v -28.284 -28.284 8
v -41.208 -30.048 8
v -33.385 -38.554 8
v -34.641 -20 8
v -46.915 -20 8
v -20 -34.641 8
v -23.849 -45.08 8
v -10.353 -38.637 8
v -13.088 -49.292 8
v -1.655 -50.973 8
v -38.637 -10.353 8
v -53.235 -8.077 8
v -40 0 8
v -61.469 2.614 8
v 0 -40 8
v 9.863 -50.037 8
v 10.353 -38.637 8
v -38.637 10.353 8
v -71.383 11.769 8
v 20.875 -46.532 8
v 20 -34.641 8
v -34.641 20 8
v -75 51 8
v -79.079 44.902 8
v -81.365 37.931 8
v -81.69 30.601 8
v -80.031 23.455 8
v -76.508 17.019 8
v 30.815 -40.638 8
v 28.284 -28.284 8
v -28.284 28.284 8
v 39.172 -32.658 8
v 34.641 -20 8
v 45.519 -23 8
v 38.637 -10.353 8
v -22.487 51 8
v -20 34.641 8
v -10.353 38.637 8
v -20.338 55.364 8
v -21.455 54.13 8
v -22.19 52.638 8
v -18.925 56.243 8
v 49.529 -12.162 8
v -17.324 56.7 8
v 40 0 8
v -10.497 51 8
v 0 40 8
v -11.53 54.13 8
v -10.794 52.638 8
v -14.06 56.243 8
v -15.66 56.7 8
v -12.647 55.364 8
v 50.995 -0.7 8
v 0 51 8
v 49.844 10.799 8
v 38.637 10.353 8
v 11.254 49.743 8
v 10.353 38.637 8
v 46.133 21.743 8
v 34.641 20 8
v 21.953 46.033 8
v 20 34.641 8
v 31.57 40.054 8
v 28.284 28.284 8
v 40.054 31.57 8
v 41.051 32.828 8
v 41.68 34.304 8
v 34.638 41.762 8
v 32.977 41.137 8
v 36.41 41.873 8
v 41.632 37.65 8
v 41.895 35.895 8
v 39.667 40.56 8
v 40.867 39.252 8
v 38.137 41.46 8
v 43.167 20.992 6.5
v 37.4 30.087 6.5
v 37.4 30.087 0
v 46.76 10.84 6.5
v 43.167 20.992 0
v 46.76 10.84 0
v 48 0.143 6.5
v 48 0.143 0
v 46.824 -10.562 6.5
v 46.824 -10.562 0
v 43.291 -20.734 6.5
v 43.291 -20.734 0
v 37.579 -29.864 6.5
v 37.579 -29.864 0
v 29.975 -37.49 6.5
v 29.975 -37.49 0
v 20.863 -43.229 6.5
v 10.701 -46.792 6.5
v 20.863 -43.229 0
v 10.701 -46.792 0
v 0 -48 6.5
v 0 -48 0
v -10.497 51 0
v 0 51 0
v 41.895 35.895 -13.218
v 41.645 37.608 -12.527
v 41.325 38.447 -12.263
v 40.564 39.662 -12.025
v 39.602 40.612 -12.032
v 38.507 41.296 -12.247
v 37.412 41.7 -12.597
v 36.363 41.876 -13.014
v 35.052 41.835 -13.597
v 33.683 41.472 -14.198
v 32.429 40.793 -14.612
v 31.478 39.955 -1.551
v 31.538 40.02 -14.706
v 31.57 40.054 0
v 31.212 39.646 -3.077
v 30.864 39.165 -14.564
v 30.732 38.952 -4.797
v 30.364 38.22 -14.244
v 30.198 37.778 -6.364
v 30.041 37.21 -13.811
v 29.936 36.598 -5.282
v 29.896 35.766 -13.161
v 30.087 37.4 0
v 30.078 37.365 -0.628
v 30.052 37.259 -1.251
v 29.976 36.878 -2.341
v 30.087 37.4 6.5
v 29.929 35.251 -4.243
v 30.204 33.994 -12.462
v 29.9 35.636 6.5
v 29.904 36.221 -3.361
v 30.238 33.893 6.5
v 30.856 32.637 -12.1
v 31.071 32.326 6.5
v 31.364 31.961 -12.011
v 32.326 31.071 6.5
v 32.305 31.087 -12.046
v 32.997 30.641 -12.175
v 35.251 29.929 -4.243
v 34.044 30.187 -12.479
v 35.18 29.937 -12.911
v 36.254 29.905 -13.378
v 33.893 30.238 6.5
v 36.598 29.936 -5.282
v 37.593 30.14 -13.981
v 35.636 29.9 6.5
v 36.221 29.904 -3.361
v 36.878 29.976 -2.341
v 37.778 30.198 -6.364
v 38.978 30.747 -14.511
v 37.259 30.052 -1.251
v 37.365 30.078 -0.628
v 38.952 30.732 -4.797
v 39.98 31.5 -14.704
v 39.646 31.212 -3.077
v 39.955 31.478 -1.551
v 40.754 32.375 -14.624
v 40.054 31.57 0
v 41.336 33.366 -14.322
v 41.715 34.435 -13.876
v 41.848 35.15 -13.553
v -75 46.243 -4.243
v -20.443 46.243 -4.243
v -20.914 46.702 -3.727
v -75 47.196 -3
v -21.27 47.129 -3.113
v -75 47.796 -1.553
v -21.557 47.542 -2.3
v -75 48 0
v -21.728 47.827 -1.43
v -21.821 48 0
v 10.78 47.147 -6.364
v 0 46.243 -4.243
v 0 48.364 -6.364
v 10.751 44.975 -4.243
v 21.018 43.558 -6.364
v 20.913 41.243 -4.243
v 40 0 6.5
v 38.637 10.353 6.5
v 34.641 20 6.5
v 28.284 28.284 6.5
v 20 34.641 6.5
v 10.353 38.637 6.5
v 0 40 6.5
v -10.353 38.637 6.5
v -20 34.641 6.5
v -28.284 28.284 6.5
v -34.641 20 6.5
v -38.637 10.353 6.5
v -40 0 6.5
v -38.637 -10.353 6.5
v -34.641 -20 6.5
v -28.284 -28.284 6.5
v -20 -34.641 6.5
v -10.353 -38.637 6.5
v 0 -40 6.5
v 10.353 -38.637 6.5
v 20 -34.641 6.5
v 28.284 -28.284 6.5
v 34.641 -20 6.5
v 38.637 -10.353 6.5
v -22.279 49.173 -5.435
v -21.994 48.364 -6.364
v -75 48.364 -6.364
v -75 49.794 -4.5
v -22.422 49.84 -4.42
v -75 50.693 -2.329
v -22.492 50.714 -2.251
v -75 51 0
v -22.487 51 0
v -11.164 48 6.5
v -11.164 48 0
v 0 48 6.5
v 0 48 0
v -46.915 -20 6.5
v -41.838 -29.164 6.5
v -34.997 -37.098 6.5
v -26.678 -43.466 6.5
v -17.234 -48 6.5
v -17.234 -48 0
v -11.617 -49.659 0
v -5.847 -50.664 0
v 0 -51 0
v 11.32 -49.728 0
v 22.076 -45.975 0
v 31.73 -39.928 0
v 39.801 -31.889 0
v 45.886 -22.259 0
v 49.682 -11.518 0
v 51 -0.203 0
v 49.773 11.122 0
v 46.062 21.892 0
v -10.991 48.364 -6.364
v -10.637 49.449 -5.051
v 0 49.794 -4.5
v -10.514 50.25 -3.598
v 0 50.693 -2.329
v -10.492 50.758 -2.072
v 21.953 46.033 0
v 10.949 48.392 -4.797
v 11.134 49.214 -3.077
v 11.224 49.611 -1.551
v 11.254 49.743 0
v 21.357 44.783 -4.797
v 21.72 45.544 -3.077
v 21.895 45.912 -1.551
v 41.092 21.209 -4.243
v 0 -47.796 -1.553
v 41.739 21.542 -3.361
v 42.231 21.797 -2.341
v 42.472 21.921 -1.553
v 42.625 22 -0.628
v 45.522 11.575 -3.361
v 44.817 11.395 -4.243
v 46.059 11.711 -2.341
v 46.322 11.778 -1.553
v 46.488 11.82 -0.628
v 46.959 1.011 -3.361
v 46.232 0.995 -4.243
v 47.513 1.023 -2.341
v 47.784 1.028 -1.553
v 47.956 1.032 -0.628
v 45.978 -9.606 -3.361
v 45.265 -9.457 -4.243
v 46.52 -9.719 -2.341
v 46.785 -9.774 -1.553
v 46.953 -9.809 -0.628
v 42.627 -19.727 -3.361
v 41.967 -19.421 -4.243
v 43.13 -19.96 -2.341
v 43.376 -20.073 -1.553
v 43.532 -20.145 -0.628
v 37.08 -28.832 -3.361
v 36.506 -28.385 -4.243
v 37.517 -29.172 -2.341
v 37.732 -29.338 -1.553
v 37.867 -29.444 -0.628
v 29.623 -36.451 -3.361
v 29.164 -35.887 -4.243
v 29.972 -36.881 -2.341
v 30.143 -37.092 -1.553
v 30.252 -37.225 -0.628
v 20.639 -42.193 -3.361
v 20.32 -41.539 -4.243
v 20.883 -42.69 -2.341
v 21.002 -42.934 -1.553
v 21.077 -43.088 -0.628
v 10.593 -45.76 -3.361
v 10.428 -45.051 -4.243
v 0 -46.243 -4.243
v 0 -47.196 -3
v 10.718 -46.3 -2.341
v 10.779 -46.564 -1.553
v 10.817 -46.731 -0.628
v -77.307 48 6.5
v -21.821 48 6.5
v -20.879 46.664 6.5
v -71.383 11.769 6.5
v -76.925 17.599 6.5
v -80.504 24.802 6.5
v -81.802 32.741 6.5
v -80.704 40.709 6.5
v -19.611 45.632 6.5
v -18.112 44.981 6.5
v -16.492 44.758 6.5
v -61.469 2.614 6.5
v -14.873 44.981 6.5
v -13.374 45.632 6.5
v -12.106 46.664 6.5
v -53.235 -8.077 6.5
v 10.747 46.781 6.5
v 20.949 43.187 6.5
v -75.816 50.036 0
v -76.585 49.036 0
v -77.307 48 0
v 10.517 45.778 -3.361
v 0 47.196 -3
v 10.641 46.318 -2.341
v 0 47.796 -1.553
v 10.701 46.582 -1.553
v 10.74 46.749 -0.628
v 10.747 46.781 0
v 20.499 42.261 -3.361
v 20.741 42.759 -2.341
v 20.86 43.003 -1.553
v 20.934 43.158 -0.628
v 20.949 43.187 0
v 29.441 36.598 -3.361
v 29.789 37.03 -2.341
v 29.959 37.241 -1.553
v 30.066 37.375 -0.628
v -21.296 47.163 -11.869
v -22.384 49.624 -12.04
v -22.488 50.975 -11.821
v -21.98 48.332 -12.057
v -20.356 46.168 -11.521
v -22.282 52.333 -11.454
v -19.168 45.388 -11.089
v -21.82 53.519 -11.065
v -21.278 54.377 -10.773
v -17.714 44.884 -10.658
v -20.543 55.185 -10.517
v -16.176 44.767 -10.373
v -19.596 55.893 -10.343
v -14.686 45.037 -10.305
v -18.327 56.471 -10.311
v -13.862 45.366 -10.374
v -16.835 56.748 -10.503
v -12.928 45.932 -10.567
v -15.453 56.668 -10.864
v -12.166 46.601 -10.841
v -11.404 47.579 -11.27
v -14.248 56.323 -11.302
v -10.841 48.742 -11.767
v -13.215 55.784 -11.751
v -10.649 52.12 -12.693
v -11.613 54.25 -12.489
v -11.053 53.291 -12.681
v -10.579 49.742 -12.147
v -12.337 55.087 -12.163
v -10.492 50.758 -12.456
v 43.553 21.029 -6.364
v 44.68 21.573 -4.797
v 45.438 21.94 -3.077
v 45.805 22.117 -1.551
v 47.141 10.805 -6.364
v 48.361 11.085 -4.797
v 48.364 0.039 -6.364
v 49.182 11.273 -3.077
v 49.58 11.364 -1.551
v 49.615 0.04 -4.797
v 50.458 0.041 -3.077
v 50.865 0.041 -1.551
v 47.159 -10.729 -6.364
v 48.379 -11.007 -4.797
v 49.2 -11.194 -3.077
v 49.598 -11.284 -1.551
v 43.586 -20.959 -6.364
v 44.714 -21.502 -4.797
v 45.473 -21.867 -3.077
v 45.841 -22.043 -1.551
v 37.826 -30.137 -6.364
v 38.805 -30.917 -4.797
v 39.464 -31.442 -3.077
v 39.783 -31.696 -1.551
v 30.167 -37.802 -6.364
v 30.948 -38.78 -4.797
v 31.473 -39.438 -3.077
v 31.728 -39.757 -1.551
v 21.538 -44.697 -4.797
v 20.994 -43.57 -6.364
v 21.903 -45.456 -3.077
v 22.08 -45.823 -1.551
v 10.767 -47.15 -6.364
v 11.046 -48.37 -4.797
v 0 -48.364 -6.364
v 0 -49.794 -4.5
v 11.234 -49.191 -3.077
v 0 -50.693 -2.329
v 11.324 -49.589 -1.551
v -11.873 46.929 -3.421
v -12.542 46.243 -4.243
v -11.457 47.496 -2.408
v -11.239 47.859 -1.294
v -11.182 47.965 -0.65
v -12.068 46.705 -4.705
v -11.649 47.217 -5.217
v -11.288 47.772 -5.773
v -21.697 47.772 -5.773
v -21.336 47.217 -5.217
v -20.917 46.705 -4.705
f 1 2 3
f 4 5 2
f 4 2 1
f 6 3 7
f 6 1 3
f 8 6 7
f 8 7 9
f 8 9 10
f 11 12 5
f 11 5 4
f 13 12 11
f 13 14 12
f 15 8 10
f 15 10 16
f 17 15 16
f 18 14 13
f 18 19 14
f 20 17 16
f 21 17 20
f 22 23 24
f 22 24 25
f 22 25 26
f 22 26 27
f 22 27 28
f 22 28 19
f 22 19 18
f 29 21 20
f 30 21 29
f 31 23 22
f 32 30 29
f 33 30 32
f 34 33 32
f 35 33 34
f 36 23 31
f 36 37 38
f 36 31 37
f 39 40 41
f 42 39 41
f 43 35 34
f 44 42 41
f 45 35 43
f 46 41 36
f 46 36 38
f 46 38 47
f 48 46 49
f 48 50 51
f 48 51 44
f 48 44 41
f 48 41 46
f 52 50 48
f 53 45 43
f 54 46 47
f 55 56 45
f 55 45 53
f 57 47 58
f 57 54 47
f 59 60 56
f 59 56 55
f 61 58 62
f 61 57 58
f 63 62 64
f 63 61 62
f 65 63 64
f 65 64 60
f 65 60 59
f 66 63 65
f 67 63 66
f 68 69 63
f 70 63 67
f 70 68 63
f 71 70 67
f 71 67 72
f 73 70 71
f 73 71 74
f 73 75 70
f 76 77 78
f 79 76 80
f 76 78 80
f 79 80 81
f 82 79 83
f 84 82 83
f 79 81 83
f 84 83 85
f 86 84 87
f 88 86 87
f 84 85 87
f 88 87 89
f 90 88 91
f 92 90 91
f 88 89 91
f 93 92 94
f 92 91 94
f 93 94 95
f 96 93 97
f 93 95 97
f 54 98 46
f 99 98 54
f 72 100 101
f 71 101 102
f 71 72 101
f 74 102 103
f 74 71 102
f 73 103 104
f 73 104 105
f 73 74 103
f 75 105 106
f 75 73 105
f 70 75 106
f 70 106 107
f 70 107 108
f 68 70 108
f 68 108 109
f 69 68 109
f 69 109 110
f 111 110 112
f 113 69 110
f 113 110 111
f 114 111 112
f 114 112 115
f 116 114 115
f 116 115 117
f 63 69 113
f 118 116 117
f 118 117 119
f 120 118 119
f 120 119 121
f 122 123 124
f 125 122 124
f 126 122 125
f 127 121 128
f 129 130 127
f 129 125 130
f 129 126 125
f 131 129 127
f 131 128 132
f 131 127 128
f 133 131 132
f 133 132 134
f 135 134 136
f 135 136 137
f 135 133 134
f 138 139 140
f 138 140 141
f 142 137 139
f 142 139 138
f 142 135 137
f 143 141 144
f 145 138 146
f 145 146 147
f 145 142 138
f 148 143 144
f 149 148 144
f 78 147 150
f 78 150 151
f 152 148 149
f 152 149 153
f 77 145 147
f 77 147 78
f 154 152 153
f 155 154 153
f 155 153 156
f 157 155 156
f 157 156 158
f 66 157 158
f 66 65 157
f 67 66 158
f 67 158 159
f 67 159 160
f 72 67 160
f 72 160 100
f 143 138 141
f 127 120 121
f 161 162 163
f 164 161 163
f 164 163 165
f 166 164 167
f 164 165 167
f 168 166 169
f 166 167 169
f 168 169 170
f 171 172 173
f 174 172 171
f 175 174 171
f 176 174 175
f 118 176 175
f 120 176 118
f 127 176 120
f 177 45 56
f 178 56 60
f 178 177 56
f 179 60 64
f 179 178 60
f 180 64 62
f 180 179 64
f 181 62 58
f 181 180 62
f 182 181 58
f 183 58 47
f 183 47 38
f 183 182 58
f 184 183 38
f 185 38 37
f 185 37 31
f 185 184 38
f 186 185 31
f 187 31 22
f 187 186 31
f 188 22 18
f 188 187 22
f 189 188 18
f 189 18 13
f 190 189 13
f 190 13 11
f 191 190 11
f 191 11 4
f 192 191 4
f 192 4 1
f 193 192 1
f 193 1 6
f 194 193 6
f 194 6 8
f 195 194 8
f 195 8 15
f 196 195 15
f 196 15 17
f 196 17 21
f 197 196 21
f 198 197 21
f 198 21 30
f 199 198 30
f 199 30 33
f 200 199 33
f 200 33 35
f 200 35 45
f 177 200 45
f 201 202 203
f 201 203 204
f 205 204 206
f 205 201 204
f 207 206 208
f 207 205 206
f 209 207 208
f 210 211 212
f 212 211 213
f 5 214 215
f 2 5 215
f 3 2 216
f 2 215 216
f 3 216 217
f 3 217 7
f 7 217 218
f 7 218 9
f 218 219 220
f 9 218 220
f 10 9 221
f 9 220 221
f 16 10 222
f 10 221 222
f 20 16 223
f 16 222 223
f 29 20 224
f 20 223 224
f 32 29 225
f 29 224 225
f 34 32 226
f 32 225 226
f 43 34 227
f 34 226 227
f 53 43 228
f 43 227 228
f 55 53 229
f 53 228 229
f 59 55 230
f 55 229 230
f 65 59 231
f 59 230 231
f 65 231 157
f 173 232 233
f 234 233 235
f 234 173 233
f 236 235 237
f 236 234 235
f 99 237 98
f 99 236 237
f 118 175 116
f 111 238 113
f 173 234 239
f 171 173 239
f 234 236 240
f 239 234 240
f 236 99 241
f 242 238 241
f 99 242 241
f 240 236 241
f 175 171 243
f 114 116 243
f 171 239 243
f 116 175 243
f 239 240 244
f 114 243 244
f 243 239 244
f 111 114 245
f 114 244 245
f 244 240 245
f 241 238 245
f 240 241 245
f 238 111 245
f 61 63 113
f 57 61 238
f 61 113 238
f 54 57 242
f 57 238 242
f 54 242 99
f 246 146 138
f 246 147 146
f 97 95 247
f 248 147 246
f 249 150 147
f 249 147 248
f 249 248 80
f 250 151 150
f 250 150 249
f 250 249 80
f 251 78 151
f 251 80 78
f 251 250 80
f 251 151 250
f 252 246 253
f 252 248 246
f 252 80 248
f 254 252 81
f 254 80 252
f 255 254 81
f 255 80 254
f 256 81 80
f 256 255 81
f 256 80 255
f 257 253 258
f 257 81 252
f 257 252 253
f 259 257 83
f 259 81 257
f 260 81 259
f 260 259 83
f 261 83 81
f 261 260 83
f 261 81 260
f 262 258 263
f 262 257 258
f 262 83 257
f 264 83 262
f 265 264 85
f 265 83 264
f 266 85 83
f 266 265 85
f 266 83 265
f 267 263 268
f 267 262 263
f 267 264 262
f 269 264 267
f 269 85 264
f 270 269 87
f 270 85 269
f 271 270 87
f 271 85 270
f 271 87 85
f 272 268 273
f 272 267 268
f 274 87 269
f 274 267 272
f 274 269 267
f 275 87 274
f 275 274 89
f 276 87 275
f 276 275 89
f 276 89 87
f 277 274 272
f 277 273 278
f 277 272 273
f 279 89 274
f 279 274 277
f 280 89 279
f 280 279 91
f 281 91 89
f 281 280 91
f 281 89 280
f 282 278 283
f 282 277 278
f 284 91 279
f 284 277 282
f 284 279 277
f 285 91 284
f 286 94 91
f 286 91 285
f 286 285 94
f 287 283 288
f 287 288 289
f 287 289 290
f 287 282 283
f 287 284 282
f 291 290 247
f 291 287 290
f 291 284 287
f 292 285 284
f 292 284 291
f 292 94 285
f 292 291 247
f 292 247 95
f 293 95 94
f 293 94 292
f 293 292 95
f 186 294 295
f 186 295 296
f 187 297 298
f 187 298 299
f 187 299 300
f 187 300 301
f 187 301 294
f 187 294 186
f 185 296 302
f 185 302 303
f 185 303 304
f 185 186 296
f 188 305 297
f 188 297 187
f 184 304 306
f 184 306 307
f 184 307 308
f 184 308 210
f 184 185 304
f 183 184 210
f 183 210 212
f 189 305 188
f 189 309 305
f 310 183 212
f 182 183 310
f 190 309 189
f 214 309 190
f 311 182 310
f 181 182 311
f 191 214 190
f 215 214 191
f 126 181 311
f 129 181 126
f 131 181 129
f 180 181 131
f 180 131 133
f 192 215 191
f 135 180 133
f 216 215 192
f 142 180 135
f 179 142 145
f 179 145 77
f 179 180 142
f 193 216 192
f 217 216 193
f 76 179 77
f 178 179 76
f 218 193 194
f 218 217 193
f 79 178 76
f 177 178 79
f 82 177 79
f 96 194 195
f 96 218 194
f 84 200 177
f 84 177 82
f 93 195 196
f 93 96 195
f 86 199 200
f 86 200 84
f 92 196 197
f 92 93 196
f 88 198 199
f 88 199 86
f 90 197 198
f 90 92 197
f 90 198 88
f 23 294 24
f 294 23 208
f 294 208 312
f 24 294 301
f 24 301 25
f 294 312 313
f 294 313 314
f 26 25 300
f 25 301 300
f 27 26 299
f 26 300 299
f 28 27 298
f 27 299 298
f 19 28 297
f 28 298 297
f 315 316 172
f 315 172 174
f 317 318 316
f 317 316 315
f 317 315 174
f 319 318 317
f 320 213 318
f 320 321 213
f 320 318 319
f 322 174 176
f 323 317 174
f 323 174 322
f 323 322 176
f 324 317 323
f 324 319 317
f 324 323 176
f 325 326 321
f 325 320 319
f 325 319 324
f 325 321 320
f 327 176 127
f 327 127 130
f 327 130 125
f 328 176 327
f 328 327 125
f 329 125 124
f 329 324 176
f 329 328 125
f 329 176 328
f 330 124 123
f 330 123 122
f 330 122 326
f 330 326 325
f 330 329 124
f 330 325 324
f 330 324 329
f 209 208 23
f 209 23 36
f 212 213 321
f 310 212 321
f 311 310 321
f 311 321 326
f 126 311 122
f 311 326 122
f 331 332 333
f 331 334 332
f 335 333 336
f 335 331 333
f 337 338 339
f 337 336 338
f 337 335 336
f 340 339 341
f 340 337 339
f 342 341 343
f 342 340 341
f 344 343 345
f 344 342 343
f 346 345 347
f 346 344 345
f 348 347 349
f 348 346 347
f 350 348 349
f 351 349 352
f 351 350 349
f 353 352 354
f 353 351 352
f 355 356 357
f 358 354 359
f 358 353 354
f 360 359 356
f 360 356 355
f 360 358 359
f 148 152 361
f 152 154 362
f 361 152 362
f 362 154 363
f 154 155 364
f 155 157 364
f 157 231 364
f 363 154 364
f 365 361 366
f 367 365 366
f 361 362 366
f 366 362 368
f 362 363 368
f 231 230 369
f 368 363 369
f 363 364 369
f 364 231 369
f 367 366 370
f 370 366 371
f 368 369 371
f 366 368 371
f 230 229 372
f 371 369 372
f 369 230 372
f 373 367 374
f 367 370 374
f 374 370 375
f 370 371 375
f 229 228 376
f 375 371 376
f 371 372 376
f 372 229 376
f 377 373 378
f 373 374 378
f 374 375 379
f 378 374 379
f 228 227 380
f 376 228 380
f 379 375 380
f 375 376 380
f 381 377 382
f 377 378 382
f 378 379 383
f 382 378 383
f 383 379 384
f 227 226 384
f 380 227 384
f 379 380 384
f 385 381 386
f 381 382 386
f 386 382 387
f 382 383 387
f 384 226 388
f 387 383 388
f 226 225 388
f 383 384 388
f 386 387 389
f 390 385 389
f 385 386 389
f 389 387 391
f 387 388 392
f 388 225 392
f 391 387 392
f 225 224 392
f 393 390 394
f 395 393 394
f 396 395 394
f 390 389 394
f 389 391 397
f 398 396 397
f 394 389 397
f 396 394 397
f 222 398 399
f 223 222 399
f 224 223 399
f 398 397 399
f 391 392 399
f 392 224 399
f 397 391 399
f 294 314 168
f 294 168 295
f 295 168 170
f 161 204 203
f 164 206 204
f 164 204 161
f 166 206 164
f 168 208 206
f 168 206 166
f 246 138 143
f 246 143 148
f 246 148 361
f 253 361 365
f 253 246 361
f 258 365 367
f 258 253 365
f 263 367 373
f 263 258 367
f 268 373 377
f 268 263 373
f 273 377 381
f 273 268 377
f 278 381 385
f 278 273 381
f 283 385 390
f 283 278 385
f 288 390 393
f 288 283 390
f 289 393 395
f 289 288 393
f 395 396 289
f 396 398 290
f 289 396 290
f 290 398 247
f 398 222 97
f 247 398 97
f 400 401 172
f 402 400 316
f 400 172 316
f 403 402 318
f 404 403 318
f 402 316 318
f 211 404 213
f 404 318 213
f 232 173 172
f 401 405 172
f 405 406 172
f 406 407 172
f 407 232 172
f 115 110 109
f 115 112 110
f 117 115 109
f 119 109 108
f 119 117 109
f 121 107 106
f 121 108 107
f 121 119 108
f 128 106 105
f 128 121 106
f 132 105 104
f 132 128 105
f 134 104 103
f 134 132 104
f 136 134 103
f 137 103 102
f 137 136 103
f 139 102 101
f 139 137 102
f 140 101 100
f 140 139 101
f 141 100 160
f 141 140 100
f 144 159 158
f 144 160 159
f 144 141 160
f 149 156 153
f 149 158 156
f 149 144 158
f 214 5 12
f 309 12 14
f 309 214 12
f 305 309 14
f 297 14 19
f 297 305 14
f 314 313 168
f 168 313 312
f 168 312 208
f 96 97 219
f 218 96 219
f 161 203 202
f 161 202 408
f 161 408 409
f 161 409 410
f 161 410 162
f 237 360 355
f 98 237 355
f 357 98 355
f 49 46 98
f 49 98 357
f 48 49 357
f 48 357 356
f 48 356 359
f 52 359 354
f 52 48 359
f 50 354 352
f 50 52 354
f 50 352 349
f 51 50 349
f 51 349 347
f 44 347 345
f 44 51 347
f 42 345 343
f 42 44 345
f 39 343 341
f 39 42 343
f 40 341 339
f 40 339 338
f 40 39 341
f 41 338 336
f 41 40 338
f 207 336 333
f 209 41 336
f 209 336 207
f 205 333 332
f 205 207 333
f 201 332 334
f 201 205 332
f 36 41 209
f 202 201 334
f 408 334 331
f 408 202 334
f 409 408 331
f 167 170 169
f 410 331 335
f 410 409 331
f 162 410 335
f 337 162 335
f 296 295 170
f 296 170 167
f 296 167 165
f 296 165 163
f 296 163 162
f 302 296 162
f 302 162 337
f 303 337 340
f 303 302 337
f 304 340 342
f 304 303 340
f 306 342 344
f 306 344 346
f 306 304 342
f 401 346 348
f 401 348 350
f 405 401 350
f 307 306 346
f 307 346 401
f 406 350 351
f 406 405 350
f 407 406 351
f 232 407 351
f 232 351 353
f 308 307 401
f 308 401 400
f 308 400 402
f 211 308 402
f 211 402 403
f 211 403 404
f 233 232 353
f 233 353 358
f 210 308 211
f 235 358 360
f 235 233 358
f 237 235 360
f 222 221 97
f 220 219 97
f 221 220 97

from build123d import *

# Parameters (mm, degrees)
CYLINDER_R                  = 9.7
CYLINDER_DEPTH              = 100
CYLINDER_ROLL_ANGLE         = -90
CYLINDER_PITCH_ANGLE        = -18.434967
CYLINDER_PLACEMENT_ANGLE    = 18.434967
CYLINDER001_R               = 8
CYLINDER001_DEPTH           = 100
CYLINDER001_ROLL_ANGLE      = -90
CYLINDER001_PITCH_ANGLE     = 45
CYLINDER001_PLACEMENT_ANGLE = -45
REVOLUTION_ANGLE            = -180
SKETCH005_R                 = 6
PAD001_DEPTH                = 8
PAD001_DEPTH_BACK           = 25
PAD002_DEPTH                = 75
SKETCH_R                    = 40
PAD_DEPTH                   = 8
POCKET_DEPTH                = 6.5


with BuildPart() as cylinder:
    # Cylinder → Cylinder (new body)
    with BuildSketch(Plane.XY):
        Circle(CYLINDER_R)
    extrude(amount=CYLINDER_DEPTH)


with BuildPart() as cylinder_1:
    # Cylinder roll: moved
    add(cylinder.part.rotate(Axis((0, 0, 0), (1, 0, 0)), CYLINDER_ROLL_ANGLE))


with BuildPart() as cylinder_2:
    # Cylinder pitch: moved
    add(cylinder_1.part.rotate(Axis((0, 0, 0), (0, 1, 0)), CYLINDER_PITCH_ANGLE))


with BuildPart() as cylinder_3:
    # Cylinder placement: moved
    add(cylinder_2.part.moved(Location((0, 0, -20))).rotate(Axis((0, 0, -20), (0, 0, 1)), CYLINDER_PLACEMENT_ANGLE))


with BuildPart() as fusion001:
    # Cylinder001 → Cylinder001 (new body)
    with BuildSketch(Plane.XY):
        Circle(CYLINDER001_R)
    extrude(amount=CYLINDER001_DEPTH)


with BuildPart() as fusion001_1:
    # Cylinder001 roll: moved
    add(fusion001.part.rotate(Axis((0, 0, 0), (1, 0, 0)), CYLINDER001_ROLL_ANGLE))


with BuildPart() as fusion001_2:
    # Cylinder001 pitch: moved
    add(fusion001_1.part.rotate(Axis((0, 0, 0), (0, 1, 0)), CYLINDER001_PITCH_ANGLE))


with BuildPart() as fusion001_3:
    # Cylinder001 placement: moved
    add(fusion001_2.part.moved(Location((0, 0, -20))).rotate(Axis((0, 0, -20), (0, 0, 1)), CYLINDER001_PLACEMENT_ANGLE))

    # Fusion001: union Cylinder
    add(cylinder_3.part)


with BuildPart() as revolution:
    # Sketch004 → Revolution (revolve)
    with BuildSketch(Plane.YZ):
        with BuildLine():
            Line((48.363934, -6.363988), (46.242623, -4.242658))
            ThreePointArc((46.242623, -4.242658), (47.543272, -2.296112), (48, 0))
            Line((48, 0), (51, 0))
            ThreePointArc((48.363934, -6.363988), (50.314909, -3.444168), (51, 0))
        make_face()
    revolve(axis=Axis((0, 0, 0), (0, 0, 1)), revolution_arc=REVOLUTION_ANGLE)


with BuildPart() as pad001:
    # Sketch005 → Pad001 (new body, two sides)
    with BuildSketch(Plane.XY) as pad001_sk:
        with Locations((-16.492364, 50.758278)):
            Circle(SKETCH005_R)
        with Locations((35.894688, 35.894688)):
            Circle(SKETCH005_R)
    extrude(amount=PAD001_DEPTH)
    extrude(pad001_sk.sketch, amount=-PAD001_DEPTH_BACK)


with BuildPart() as pad002:
    # Sketch006 → Pad002 (new body)
    with BuildSketch(Plane.YZ):
        with BuildLine():
            Line((48.363934, -6.363988), (46.242623, -4.242658))
            ThreePointArc((46.242623, -4.242658), (47.543272, -2.296112), (48, 0))
            Line((48, 0), (51, 0))
            ThreePointArc((48.363934, -6.363988), (50.314909, -3.444168), (51, 0))
        make_face()
    extrude(amount=-PAD002_DEPTH)


with BuildPart() as cut:
    # Sketch → Pad (new body)
    with BuildSketch(Plane.XY):
        with BuildLine():
            ThreePointArc((-46.914816, -20), (42.549971, -28.115832), (0, 51))
            Line((-75, 51), (0, 51))
            ThreePointArc((-75, 51), (-81.690324, 30.60121), (-71.383422, 11.769352))
            ThreePointArc((-46.914816, -20), (-57.126294, -2.557354), (-71.383422, 11.769352))
        make_face()
        Circle(SKETCH_R, mode=Mode.SUBTRACT)
    extrude(amount=PAD_DEPTH)

    # Sketch001 → Pocket (cut)
    with BuildSketch(Plane(origin=(0, 0, 0), x_dir=(1, 0, 0), z_dir=(0, 0, -1))):
        with BuildLine():
            Line((-146.216, -48), (0, -48))
            ThreePointArc((0, -48), (48, 0), (0, 48))
            Line((0, 48), (-146.216, 48))
            Line((-146.216, -48), (-146.216, 48))
        make_face()
    extrude(amount=-POCKET_DEPTH, mode=Mode.SUBTRACT)

    # Fusion: union Revolution, Pad001, Pad002
    add(revolution.part)
    add(pad001.part)
    add(pad002.part)

    # Cut: cut Fusion001
    add(fusion001_3.part, mode=Mode.SUBTRACT)


solid = cut.part
